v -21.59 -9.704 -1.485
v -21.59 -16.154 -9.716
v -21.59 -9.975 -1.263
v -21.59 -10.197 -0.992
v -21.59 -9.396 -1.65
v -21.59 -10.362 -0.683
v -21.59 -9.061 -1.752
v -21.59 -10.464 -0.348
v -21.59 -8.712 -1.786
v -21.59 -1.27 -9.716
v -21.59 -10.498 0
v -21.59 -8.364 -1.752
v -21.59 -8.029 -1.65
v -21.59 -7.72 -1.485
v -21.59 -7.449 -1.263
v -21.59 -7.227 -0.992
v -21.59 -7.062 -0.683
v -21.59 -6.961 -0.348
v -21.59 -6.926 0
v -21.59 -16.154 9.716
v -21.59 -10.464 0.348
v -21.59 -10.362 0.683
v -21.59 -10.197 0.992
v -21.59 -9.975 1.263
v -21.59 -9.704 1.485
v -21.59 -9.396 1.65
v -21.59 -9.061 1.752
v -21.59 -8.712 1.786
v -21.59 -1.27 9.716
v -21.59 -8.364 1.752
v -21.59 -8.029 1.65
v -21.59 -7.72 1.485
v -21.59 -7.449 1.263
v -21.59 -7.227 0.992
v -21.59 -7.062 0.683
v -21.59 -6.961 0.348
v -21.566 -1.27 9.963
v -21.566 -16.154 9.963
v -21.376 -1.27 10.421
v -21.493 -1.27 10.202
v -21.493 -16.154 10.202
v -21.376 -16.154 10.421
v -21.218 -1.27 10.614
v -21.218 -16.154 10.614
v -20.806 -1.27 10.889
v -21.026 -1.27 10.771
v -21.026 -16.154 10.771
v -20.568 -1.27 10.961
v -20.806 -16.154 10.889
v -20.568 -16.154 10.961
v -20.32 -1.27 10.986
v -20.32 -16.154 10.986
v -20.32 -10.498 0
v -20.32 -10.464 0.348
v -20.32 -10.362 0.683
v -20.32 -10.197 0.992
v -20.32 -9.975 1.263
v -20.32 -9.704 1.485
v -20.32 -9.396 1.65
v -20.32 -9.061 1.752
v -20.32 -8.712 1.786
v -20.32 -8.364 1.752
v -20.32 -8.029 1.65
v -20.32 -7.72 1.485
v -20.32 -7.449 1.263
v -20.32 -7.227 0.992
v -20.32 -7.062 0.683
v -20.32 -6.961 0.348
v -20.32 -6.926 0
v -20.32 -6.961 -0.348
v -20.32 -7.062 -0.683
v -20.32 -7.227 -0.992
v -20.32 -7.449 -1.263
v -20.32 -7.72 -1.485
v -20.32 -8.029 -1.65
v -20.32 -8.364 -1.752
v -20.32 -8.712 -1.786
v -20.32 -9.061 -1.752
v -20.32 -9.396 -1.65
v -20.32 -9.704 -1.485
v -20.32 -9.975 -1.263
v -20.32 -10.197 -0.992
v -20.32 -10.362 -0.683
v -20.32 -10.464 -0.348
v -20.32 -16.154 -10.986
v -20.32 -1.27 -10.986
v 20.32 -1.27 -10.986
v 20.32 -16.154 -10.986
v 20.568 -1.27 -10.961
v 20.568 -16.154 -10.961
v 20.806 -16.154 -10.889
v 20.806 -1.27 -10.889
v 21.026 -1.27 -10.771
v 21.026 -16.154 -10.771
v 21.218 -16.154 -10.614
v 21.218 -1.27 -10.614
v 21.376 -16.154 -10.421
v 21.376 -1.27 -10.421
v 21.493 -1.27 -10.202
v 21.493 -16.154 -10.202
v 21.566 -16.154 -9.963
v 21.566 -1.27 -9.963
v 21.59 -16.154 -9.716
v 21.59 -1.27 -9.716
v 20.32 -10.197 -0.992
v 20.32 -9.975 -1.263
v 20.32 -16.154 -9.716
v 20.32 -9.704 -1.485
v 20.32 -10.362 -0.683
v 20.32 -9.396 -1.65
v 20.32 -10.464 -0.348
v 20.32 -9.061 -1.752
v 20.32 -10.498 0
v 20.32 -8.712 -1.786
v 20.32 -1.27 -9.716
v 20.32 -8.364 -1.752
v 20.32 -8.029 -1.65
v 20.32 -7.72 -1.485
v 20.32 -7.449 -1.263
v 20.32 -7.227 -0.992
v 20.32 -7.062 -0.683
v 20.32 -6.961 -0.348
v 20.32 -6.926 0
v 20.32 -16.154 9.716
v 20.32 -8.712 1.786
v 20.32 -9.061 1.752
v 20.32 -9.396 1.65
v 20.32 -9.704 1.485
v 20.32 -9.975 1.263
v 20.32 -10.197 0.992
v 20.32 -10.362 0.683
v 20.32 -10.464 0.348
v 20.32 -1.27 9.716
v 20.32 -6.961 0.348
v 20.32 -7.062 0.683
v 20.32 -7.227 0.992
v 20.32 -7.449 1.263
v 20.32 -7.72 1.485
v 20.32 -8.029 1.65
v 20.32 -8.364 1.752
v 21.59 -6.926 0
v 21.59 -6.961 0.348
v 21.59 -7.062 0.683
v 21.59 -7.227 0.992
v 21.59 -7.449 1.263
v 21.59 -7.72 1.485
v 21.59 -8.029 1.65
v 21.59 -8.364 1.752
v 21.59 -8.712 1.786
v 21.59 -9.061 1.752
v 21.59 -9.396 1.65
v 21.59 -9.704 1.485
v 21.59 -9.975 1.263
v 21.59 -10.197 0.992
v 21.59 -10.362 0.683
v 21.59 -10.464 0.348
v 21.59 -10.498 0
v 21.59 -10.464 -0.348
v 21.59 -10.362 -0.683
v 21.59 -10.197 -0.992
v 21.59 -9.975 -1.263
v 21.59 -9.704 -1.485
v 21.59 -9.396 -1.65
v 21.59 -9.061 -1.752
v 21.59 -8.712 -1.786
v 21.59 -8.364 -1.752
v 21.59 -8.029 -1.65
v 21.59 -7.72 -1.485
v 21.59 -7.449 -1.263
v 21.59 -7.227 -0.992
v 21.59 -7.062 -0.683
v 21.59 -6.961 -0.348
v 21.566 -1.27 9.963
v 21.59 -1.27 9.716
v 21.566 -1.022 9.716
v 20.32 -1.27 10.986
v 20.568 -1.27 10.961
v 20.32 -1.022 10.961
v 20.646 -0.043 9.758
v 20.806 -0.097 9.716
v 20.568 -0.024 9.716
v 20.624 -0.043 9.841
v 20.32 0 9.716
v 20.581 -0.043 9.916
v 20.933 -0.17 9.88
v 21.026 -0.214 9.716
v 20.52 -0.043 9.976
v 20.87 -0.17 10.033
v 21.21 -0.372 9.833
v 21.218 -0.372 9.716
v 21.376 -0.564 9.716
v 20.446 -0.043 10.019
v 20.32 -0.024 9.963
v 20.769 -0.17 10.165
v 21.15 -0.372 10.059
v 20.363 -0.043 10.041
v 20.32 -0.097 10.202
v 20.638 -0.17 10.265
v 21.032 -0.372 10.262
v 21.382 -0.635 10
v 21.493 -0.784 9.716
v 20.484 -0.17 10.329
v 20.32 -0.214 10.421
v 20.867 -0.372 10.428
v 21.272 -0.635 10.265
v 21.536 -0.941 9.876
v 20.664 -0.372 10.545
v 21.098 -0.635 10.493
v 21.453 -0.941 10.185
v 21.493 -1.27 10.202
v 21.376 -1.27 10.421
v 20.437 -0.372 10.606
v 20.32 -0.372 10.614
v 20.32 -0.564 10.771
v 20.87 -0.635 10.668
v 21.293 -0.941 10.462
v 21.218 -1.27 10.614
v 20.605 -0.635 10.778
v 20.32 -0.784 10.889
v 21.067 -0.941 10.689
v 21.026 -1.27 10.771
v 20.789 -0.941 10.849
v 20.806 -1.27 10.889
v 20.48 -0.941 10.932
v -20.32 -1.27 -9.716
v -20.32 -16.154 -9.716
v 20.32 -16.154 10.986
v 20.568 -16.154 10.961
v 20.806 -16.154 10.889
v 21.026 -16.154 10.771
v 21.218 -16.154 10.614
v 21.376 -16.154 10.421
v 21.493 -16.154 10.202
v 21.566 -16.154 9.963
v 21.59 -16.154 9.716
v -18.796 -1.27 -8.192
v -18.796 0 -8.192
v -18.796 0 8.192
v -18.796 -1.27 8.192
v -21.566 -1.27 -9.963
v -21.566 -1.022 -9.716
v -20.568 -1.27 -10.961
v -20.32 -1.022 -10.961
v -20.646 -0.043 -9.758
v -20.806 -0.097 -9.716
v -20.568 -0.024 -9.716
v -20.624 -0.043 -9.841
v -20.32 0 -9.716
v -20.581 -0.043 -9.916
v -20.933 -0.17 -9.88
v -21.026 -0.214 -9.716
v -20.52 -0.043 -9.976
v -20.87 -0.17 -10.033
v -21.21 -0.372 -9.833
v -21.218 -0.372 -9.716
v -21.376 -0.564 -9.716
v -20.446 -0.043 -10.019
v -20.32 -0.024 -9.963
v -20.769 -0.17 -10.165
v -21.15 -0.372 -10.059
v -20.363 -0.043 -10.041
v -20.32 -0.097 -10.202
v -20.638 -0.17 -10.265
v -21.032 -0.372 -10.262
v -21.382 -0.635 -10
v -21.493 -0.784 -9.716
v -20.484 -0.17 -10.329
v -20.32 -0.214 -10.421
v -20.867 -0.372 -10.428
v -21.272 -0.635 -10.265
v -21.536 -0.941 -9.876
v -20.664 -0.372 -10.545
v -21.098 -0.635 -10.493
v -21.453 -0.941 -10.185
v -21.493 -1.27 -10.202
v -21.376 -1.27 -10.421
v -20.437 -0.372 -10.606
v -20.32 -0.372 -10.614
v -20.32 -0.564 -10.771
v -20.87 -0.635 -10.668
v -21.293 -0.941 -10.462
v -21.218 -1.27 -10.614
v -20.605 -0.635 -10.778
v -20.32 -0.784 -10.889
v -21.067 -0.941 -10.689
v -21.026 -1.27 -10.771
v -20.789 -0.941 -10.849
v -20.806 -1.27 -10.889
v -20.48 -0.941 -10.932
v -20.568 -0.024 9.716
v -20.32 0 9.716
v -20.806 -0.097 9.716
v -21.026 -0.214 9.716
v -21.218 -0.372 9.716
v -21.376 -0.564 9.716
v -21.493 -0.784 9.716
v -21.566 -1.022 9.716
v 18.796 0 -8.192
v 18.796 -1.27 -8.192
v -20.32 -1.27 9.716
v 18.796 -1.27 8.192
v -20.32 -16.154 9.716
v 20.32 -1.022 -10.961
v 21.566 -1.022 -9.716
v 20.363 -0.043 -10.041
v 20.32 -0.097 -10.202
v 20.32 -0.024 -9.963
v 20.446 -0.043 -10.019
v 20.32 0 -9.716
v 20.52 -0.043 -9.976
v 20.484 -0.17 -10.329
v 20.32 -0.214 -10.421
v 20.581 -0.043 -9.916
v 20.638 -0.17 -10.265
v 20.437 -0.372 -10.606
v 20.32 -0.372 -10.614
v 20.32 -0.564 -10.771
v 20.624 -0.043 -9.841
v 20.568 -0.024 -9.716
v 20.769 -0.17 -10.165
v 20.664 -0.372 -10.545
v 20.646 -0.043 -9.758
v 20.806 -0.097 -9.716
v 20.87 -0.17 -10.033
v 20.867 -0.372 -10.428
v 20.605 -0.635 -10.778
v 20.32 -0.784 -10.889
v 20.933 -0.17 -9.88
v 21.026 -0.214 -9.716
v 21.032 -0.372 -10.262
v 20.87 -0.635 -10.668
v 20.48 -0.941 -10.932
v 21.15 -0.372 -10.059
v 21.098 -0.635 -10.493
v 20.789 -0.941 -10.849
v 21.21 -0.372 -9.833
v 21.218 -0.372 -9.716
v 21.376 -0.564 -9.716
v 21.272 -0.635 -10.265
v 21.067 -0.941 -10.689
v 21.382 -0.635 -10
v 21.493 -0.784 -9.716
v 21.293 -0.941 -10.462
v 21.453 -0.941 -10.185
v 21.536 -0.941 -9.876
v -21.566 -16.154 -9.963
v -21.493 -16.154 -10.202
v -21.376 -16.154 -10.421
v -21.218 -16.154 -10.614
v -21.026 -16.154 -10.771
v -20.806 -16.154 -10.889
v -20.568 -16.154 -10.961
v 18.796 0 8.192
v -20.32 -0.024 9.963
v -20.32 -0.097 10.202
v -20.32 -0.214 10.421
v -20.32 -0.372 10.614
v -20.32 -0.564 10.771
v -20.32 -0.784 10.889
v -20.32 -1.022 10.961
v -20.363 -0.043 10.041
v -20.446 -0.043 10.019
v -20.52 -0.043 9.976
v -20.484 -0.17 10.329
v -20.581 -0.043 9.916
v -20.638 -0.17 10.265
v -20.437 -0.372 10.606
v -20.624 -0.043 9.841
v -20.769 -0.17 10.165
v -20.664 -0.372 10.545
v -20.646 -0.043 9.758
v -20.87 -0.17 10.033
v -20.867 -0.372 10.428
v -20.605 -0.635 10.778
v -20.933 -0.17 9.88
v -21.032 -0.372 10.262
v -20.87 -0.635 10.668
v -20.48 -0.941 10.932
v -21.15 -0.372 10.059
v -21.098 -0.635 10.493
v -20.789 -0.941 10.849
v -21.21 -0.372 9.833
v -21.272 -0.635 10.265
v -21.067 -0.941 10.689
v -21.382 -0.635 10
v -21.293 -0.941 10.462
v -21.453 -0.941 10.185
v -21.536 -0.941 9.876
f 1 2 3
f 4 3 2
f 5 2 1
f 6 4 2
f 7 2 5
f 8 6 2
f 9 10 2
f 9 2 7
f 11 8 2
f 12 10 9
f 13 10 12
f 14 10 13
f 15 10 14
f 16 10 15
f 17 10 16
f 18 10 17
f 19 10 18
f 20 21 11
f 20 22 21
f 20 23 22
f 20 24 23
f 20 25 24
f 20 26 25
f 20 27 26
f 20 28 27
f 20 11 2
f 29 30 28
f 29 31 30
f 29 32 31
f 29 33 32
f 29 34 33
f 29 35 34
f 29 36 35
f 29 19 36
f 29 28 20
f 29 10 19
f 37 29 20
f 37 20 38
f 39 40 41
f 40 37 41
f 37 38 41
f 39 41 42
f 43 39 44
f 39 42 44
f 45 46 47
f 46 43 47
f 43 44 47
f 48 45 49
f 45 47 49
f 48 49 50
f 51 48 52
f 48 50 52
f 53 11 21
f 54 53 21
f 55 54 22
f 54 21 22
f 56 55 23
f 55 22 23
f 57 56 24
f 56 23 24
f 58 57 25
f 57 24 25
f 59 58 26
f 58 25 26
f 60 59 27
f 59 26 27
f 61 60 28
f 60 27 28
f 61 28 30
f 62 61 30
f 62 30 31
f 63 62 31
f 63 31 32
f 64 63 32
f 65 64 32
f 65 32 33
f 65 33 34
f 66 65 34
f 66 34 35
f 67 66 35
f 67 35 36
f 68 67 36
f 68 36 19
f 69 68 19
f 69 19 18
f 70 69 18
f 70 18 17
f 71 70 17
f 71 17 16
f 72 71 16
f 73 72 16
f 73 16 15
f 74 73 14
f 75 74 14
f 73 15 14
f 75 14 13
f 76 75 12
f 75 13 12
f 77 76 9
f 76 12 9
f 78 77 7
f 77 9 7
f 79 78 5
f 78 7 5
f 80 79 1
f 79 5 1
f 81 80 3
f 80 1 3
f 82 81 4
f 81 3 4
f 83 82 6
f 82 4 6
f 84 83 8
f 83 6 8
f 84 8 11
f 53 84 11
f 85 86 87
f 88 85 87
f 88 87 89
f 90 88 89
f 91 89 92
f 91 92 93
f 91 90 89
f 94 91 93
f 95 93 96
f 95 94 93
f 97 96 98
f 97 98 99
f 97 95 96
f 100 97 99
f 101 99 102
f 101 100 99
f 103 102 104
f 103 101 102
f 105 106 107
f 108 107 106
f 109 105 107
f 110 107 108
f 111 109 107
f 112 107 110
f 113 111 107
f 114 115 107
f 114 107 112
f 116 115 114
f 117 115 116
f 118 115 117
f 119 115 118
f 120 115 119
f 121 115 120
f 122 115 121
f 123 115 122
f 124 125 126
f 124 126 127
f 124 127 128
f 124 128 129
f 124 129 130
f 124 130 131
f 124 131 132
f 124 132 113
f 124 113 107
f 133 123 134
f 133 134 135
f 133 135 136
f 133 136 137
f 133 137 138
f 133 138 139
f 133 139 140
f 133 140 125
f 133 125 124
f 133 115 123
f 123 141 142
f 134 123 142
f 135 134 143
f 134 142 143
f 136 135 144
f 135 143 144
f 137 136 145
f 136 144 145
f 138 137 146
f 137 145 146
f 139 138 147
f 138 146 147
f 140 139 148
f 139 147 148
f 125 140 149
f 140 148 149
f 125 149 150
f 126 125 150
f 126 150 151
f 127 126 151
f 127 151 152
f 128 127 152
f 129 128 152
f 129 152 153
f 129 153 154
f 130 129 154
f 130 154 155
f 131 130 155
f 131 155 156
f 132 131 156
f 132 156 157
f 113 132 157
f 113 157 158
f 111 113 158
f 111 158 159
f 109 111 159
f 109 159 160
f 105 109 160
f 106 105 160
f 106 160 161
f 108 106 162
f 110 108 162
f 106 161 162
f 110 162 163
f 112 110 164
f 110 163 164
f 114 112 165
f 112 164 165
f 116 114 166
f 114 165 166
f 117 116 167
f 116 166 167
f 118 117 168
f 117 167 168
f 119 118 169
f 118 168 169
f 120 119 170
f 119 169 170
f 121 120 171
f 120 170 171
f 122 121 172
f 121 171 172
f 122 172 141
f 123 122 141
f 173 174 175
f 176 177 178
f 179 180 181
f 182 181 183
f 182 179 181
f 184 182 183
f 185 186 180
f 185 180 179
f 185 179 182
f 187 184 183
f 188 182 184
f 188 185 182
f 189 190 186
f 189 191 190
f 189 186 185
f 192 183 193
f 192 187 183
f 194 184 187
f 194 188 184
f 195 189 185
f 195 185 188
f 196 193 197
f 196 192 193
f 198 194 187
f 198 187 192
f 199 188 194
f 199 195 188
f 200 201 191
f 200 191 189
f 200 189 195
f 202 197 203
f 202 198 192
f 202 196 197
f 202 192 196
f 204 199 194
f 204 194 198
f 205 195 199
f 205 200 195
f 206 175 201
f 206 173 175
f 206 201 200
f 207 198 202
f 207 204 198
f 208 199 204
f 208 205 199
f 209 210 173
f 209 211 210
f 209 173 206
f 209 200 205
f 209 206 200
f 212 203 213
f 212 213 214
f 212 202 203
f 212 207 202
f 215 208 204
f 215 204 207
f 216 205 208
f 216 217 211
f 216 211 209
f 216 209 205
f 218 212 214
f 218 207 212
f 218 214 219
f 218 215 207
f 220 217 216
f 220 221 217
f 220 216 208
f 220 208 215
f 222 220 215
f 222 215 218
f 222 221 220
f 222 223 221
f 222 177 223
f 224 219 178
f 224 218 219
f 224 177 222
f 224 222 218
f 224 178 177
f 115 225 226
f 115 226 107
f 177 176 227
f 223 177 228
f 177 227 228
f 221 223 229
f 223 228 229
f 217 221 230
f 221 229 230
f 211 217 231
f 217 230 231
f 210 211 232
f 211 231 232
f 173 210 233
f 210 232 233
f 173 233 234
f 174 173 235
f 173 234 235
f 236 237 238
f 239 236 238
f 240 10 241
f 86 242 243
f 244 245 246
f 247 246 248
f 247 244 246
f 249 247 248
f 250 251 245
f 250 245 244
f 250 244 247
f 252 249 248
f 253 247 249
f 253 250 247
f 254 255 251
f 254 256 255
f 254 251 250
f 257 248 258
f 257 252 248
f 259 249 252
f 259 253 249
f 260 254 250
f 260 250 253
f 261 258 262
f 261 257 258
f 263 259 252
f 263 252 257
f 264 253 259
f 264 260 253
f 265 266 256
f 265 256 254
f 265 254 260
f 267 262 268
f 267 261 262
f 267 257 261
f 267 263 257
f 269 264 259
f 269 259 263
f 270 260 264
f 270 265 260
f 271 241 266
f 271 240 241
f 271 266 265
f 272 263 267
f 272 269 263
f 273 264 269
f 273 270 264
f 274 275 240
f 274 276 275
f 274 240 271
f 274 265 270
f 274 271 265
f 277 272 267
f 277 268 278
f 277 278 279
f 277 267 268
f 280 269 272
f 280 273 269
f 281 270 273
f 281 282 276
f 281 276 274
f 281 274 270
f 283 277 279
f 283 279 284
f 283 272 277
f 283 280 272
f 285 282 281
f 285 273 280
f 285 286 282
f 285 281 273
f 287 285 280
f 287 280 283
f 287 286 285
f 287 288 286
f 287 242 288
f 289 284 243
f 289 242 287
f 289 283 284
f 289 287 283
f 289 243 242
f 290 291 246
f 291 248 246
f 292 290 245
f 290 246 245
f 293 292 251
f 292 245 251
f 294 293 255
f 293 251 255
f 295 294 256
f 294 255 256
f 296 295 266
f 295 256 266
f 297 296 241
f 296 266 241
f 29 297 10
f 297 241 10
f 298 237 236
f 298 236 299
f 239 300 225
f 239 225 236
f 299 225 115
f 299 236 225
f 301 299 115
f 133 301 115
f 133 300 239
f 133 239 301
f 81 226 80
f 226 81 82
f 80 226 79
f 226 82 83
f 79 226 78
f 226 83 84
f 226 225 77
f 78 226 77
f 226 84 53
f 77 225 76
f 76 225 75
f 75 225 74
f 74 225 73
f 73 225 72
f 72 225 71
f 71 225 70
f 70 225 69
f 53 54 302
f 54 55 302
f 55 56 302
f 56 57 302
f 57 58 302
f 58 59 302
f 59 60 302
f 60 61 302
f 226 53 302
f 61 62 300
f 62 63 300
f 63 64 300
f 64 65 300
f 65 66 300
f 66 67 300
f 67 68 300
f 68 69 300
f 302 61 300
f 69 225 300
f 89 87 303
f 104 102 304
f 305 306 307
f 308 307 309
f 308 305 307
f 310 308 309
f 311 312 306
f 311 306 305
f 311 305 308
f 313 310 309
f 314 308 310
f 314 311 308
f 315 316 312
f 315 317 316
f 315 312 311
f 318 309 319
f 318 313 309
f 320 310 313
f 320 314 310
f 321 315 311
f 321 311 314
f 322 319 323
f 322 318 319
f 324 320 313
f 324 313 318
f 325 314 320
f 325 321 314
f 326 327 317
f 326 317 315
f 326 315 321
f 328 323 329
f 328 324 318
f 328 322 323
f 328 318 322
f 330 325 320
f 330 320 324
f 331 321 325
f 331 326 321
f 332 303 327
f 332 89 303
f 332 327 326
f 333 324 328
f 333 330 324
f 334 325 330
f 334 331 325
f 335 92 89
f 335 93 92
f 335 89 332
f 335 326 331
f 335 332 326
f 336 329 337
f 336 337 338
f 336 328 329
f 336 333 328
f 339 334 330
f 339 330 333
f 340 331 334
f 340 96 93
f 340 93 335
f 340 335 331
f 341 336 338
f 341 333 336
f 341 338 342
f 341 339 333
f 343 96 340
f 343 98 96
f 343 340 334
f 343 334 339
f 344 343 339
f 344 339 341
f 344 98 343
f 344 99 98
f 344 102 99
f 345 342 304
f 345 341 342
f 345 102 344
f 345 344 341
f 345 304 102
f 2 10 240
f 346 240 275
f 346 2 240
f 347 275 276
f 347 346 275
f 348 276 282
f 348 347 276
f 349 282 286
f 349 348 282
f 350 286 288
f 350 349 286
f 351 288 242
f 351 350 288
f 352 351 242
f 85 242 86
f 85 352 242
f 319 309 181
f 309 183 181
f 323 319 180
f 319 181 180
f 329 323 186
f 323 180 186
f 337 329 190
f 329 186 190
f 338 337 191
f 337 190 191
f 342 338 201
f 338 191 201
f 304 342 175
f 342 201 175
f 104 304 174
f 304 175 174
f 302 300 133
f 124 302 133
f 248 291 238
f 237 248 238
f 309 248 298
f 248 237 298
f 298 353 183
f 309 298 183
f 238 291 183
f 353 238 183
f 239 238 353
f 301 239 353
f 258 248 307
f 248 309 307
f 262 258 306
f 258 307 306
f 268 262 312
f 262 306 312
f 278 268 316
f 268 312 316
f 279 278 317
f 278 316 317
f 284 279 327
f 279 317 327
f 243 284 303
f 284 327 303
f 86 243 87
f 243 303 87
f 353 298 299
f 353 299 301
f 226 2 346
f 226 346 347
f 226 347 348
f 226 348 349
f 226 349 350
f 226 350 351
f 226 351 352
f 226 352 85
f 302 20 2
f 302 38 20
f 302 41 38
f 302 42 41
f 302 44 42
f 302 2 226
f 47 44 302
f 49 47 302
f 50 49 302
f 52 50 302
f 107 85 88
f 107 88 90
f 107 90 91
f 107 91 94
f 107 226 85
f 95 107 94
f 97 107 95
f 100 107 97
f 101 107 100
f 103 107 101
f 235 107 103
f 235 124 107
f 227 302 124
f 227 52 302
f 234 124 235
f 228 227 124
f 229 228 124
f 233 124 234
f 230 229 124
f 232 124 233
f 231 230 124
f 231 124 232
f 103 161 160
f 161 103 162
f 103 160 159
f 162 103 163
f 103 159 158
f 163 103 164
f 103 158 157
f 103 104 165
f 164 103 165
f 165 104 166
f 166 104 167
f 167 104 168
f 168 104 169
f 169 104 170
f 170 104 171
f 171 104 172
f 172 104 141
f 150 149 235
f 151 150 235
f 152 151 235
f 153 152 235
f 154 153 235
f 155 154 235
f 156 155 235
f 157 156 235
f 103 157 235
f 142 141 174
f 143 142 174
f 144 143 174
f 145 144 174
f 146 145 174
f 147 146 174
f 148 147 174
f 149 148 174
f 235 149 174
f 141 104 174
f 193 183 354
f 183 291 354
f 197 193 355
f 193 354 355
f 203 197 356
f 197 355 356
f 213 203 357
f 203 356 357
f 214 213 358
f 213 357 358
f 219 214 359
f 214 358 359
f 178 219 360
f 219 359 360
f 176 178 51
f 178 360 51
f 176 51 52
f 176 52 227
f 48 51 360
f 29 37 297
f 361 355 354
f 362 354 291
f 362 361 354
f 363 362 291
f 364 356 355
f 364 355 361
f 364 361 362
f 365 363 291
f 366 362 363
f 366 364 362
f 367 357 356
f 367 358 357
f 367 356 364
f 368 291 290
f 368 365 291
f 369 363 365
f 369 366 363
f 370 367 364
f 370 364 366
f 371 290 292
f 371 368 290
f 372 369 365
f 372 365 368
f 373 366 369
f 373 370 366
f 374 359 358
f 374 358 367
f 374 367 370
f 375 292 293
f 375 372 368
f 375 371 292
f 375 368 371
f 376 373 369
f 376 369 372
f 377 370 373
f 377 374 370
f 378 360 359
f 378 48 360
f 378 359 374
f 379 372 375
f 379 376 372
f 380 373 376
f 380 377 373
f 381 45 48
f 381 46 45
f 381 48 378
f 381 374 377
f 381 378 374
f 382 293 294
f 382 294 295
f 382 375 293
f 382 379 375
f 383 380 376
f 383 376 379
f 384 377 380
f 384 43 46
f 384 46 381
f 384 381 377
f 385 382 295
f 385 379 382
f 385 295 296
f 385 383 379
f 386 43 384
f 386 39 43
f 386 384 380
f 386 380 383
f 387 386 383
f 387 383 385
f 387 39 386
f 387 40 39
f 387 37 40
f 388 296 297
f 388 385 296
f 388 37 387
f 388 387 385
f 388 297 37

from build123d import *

# Parameters (mm, degrees)
F0_W     = 43.18
F0_H     = 21.971
F0_W_2   = 40.64
F0_H_2   = 19.431
F1_DEPTH = 16.1544
F0_W_3   = 37.592
F0_H_3   = 16.383
F2_DEPTH = 1.27
F3_R     = 1.27
F4_R     = 1.27
F5_R     = 1.785938
F6_DEPTH = 7.62
F7_R     = 1.785938
F8_DEPTH = 7.62


with BuildPart() as f1:
    # F0 (on Front) → F1 (new body)
    with BuildSketch(Plane.XZ):
        Rectangle(F0_W, F0_H)
        Rectangle(F0_W_2, F0_H_2, mode=Mode.SUBTRACT)
    extrude(amount=F1_DEPTH)

    # F0 (on Front) → F2 (join)
    with BuildSketch(Plane.XZ):
        Rectangle(F0_W_2, F0_H_2)
        Rectangle(F0_W_3, F0_H_3, mode=Mode.SUBTRACT)
    extrude(amount=F2_DEPTH)

    # F3
    f3_edges = [f1.edges().sort_by_distance(p)[0] for p in [
        (-21.59, -8.0772, 10.9855),
        (-21.59, -8.0772, -10.9855),
        (21.59, -8.0772, -10.9855),
        (21.59, -8.0772, 10.9855),
    ]]
    fillet(f3_edges, radius=F3_R)

    # F4
    f4_edges = [f1.edges().sort_by_distance(p)[0] for p in [
        (0, 0, -10.9855),
    ]]
    fillet(f4_edges, radius=F4_R)

    # F5 (on face) → F6 (cut)
    with BuildSketch(Plane.YZ.offset(21.59)):
        with Locations((-8.7122, 0)):
            Circle(F5_R)
    extrude(amount=-F6_DEPTH, mode=Mode.SUBTRACT)

    # F7 (on face) → F8 (cut)
    with BuildSketch(Plane(origin=(-21.59, 0, 0), x_dir=(0, -1, 0), z_dir=(-1, 0, 0))):
        with Locations((8.7122, 0)):
            Circle(F7_R)
    extrude(amount=-F8_DEPTH, mode=Mode.SUBTRACT)


solid = f1.part
